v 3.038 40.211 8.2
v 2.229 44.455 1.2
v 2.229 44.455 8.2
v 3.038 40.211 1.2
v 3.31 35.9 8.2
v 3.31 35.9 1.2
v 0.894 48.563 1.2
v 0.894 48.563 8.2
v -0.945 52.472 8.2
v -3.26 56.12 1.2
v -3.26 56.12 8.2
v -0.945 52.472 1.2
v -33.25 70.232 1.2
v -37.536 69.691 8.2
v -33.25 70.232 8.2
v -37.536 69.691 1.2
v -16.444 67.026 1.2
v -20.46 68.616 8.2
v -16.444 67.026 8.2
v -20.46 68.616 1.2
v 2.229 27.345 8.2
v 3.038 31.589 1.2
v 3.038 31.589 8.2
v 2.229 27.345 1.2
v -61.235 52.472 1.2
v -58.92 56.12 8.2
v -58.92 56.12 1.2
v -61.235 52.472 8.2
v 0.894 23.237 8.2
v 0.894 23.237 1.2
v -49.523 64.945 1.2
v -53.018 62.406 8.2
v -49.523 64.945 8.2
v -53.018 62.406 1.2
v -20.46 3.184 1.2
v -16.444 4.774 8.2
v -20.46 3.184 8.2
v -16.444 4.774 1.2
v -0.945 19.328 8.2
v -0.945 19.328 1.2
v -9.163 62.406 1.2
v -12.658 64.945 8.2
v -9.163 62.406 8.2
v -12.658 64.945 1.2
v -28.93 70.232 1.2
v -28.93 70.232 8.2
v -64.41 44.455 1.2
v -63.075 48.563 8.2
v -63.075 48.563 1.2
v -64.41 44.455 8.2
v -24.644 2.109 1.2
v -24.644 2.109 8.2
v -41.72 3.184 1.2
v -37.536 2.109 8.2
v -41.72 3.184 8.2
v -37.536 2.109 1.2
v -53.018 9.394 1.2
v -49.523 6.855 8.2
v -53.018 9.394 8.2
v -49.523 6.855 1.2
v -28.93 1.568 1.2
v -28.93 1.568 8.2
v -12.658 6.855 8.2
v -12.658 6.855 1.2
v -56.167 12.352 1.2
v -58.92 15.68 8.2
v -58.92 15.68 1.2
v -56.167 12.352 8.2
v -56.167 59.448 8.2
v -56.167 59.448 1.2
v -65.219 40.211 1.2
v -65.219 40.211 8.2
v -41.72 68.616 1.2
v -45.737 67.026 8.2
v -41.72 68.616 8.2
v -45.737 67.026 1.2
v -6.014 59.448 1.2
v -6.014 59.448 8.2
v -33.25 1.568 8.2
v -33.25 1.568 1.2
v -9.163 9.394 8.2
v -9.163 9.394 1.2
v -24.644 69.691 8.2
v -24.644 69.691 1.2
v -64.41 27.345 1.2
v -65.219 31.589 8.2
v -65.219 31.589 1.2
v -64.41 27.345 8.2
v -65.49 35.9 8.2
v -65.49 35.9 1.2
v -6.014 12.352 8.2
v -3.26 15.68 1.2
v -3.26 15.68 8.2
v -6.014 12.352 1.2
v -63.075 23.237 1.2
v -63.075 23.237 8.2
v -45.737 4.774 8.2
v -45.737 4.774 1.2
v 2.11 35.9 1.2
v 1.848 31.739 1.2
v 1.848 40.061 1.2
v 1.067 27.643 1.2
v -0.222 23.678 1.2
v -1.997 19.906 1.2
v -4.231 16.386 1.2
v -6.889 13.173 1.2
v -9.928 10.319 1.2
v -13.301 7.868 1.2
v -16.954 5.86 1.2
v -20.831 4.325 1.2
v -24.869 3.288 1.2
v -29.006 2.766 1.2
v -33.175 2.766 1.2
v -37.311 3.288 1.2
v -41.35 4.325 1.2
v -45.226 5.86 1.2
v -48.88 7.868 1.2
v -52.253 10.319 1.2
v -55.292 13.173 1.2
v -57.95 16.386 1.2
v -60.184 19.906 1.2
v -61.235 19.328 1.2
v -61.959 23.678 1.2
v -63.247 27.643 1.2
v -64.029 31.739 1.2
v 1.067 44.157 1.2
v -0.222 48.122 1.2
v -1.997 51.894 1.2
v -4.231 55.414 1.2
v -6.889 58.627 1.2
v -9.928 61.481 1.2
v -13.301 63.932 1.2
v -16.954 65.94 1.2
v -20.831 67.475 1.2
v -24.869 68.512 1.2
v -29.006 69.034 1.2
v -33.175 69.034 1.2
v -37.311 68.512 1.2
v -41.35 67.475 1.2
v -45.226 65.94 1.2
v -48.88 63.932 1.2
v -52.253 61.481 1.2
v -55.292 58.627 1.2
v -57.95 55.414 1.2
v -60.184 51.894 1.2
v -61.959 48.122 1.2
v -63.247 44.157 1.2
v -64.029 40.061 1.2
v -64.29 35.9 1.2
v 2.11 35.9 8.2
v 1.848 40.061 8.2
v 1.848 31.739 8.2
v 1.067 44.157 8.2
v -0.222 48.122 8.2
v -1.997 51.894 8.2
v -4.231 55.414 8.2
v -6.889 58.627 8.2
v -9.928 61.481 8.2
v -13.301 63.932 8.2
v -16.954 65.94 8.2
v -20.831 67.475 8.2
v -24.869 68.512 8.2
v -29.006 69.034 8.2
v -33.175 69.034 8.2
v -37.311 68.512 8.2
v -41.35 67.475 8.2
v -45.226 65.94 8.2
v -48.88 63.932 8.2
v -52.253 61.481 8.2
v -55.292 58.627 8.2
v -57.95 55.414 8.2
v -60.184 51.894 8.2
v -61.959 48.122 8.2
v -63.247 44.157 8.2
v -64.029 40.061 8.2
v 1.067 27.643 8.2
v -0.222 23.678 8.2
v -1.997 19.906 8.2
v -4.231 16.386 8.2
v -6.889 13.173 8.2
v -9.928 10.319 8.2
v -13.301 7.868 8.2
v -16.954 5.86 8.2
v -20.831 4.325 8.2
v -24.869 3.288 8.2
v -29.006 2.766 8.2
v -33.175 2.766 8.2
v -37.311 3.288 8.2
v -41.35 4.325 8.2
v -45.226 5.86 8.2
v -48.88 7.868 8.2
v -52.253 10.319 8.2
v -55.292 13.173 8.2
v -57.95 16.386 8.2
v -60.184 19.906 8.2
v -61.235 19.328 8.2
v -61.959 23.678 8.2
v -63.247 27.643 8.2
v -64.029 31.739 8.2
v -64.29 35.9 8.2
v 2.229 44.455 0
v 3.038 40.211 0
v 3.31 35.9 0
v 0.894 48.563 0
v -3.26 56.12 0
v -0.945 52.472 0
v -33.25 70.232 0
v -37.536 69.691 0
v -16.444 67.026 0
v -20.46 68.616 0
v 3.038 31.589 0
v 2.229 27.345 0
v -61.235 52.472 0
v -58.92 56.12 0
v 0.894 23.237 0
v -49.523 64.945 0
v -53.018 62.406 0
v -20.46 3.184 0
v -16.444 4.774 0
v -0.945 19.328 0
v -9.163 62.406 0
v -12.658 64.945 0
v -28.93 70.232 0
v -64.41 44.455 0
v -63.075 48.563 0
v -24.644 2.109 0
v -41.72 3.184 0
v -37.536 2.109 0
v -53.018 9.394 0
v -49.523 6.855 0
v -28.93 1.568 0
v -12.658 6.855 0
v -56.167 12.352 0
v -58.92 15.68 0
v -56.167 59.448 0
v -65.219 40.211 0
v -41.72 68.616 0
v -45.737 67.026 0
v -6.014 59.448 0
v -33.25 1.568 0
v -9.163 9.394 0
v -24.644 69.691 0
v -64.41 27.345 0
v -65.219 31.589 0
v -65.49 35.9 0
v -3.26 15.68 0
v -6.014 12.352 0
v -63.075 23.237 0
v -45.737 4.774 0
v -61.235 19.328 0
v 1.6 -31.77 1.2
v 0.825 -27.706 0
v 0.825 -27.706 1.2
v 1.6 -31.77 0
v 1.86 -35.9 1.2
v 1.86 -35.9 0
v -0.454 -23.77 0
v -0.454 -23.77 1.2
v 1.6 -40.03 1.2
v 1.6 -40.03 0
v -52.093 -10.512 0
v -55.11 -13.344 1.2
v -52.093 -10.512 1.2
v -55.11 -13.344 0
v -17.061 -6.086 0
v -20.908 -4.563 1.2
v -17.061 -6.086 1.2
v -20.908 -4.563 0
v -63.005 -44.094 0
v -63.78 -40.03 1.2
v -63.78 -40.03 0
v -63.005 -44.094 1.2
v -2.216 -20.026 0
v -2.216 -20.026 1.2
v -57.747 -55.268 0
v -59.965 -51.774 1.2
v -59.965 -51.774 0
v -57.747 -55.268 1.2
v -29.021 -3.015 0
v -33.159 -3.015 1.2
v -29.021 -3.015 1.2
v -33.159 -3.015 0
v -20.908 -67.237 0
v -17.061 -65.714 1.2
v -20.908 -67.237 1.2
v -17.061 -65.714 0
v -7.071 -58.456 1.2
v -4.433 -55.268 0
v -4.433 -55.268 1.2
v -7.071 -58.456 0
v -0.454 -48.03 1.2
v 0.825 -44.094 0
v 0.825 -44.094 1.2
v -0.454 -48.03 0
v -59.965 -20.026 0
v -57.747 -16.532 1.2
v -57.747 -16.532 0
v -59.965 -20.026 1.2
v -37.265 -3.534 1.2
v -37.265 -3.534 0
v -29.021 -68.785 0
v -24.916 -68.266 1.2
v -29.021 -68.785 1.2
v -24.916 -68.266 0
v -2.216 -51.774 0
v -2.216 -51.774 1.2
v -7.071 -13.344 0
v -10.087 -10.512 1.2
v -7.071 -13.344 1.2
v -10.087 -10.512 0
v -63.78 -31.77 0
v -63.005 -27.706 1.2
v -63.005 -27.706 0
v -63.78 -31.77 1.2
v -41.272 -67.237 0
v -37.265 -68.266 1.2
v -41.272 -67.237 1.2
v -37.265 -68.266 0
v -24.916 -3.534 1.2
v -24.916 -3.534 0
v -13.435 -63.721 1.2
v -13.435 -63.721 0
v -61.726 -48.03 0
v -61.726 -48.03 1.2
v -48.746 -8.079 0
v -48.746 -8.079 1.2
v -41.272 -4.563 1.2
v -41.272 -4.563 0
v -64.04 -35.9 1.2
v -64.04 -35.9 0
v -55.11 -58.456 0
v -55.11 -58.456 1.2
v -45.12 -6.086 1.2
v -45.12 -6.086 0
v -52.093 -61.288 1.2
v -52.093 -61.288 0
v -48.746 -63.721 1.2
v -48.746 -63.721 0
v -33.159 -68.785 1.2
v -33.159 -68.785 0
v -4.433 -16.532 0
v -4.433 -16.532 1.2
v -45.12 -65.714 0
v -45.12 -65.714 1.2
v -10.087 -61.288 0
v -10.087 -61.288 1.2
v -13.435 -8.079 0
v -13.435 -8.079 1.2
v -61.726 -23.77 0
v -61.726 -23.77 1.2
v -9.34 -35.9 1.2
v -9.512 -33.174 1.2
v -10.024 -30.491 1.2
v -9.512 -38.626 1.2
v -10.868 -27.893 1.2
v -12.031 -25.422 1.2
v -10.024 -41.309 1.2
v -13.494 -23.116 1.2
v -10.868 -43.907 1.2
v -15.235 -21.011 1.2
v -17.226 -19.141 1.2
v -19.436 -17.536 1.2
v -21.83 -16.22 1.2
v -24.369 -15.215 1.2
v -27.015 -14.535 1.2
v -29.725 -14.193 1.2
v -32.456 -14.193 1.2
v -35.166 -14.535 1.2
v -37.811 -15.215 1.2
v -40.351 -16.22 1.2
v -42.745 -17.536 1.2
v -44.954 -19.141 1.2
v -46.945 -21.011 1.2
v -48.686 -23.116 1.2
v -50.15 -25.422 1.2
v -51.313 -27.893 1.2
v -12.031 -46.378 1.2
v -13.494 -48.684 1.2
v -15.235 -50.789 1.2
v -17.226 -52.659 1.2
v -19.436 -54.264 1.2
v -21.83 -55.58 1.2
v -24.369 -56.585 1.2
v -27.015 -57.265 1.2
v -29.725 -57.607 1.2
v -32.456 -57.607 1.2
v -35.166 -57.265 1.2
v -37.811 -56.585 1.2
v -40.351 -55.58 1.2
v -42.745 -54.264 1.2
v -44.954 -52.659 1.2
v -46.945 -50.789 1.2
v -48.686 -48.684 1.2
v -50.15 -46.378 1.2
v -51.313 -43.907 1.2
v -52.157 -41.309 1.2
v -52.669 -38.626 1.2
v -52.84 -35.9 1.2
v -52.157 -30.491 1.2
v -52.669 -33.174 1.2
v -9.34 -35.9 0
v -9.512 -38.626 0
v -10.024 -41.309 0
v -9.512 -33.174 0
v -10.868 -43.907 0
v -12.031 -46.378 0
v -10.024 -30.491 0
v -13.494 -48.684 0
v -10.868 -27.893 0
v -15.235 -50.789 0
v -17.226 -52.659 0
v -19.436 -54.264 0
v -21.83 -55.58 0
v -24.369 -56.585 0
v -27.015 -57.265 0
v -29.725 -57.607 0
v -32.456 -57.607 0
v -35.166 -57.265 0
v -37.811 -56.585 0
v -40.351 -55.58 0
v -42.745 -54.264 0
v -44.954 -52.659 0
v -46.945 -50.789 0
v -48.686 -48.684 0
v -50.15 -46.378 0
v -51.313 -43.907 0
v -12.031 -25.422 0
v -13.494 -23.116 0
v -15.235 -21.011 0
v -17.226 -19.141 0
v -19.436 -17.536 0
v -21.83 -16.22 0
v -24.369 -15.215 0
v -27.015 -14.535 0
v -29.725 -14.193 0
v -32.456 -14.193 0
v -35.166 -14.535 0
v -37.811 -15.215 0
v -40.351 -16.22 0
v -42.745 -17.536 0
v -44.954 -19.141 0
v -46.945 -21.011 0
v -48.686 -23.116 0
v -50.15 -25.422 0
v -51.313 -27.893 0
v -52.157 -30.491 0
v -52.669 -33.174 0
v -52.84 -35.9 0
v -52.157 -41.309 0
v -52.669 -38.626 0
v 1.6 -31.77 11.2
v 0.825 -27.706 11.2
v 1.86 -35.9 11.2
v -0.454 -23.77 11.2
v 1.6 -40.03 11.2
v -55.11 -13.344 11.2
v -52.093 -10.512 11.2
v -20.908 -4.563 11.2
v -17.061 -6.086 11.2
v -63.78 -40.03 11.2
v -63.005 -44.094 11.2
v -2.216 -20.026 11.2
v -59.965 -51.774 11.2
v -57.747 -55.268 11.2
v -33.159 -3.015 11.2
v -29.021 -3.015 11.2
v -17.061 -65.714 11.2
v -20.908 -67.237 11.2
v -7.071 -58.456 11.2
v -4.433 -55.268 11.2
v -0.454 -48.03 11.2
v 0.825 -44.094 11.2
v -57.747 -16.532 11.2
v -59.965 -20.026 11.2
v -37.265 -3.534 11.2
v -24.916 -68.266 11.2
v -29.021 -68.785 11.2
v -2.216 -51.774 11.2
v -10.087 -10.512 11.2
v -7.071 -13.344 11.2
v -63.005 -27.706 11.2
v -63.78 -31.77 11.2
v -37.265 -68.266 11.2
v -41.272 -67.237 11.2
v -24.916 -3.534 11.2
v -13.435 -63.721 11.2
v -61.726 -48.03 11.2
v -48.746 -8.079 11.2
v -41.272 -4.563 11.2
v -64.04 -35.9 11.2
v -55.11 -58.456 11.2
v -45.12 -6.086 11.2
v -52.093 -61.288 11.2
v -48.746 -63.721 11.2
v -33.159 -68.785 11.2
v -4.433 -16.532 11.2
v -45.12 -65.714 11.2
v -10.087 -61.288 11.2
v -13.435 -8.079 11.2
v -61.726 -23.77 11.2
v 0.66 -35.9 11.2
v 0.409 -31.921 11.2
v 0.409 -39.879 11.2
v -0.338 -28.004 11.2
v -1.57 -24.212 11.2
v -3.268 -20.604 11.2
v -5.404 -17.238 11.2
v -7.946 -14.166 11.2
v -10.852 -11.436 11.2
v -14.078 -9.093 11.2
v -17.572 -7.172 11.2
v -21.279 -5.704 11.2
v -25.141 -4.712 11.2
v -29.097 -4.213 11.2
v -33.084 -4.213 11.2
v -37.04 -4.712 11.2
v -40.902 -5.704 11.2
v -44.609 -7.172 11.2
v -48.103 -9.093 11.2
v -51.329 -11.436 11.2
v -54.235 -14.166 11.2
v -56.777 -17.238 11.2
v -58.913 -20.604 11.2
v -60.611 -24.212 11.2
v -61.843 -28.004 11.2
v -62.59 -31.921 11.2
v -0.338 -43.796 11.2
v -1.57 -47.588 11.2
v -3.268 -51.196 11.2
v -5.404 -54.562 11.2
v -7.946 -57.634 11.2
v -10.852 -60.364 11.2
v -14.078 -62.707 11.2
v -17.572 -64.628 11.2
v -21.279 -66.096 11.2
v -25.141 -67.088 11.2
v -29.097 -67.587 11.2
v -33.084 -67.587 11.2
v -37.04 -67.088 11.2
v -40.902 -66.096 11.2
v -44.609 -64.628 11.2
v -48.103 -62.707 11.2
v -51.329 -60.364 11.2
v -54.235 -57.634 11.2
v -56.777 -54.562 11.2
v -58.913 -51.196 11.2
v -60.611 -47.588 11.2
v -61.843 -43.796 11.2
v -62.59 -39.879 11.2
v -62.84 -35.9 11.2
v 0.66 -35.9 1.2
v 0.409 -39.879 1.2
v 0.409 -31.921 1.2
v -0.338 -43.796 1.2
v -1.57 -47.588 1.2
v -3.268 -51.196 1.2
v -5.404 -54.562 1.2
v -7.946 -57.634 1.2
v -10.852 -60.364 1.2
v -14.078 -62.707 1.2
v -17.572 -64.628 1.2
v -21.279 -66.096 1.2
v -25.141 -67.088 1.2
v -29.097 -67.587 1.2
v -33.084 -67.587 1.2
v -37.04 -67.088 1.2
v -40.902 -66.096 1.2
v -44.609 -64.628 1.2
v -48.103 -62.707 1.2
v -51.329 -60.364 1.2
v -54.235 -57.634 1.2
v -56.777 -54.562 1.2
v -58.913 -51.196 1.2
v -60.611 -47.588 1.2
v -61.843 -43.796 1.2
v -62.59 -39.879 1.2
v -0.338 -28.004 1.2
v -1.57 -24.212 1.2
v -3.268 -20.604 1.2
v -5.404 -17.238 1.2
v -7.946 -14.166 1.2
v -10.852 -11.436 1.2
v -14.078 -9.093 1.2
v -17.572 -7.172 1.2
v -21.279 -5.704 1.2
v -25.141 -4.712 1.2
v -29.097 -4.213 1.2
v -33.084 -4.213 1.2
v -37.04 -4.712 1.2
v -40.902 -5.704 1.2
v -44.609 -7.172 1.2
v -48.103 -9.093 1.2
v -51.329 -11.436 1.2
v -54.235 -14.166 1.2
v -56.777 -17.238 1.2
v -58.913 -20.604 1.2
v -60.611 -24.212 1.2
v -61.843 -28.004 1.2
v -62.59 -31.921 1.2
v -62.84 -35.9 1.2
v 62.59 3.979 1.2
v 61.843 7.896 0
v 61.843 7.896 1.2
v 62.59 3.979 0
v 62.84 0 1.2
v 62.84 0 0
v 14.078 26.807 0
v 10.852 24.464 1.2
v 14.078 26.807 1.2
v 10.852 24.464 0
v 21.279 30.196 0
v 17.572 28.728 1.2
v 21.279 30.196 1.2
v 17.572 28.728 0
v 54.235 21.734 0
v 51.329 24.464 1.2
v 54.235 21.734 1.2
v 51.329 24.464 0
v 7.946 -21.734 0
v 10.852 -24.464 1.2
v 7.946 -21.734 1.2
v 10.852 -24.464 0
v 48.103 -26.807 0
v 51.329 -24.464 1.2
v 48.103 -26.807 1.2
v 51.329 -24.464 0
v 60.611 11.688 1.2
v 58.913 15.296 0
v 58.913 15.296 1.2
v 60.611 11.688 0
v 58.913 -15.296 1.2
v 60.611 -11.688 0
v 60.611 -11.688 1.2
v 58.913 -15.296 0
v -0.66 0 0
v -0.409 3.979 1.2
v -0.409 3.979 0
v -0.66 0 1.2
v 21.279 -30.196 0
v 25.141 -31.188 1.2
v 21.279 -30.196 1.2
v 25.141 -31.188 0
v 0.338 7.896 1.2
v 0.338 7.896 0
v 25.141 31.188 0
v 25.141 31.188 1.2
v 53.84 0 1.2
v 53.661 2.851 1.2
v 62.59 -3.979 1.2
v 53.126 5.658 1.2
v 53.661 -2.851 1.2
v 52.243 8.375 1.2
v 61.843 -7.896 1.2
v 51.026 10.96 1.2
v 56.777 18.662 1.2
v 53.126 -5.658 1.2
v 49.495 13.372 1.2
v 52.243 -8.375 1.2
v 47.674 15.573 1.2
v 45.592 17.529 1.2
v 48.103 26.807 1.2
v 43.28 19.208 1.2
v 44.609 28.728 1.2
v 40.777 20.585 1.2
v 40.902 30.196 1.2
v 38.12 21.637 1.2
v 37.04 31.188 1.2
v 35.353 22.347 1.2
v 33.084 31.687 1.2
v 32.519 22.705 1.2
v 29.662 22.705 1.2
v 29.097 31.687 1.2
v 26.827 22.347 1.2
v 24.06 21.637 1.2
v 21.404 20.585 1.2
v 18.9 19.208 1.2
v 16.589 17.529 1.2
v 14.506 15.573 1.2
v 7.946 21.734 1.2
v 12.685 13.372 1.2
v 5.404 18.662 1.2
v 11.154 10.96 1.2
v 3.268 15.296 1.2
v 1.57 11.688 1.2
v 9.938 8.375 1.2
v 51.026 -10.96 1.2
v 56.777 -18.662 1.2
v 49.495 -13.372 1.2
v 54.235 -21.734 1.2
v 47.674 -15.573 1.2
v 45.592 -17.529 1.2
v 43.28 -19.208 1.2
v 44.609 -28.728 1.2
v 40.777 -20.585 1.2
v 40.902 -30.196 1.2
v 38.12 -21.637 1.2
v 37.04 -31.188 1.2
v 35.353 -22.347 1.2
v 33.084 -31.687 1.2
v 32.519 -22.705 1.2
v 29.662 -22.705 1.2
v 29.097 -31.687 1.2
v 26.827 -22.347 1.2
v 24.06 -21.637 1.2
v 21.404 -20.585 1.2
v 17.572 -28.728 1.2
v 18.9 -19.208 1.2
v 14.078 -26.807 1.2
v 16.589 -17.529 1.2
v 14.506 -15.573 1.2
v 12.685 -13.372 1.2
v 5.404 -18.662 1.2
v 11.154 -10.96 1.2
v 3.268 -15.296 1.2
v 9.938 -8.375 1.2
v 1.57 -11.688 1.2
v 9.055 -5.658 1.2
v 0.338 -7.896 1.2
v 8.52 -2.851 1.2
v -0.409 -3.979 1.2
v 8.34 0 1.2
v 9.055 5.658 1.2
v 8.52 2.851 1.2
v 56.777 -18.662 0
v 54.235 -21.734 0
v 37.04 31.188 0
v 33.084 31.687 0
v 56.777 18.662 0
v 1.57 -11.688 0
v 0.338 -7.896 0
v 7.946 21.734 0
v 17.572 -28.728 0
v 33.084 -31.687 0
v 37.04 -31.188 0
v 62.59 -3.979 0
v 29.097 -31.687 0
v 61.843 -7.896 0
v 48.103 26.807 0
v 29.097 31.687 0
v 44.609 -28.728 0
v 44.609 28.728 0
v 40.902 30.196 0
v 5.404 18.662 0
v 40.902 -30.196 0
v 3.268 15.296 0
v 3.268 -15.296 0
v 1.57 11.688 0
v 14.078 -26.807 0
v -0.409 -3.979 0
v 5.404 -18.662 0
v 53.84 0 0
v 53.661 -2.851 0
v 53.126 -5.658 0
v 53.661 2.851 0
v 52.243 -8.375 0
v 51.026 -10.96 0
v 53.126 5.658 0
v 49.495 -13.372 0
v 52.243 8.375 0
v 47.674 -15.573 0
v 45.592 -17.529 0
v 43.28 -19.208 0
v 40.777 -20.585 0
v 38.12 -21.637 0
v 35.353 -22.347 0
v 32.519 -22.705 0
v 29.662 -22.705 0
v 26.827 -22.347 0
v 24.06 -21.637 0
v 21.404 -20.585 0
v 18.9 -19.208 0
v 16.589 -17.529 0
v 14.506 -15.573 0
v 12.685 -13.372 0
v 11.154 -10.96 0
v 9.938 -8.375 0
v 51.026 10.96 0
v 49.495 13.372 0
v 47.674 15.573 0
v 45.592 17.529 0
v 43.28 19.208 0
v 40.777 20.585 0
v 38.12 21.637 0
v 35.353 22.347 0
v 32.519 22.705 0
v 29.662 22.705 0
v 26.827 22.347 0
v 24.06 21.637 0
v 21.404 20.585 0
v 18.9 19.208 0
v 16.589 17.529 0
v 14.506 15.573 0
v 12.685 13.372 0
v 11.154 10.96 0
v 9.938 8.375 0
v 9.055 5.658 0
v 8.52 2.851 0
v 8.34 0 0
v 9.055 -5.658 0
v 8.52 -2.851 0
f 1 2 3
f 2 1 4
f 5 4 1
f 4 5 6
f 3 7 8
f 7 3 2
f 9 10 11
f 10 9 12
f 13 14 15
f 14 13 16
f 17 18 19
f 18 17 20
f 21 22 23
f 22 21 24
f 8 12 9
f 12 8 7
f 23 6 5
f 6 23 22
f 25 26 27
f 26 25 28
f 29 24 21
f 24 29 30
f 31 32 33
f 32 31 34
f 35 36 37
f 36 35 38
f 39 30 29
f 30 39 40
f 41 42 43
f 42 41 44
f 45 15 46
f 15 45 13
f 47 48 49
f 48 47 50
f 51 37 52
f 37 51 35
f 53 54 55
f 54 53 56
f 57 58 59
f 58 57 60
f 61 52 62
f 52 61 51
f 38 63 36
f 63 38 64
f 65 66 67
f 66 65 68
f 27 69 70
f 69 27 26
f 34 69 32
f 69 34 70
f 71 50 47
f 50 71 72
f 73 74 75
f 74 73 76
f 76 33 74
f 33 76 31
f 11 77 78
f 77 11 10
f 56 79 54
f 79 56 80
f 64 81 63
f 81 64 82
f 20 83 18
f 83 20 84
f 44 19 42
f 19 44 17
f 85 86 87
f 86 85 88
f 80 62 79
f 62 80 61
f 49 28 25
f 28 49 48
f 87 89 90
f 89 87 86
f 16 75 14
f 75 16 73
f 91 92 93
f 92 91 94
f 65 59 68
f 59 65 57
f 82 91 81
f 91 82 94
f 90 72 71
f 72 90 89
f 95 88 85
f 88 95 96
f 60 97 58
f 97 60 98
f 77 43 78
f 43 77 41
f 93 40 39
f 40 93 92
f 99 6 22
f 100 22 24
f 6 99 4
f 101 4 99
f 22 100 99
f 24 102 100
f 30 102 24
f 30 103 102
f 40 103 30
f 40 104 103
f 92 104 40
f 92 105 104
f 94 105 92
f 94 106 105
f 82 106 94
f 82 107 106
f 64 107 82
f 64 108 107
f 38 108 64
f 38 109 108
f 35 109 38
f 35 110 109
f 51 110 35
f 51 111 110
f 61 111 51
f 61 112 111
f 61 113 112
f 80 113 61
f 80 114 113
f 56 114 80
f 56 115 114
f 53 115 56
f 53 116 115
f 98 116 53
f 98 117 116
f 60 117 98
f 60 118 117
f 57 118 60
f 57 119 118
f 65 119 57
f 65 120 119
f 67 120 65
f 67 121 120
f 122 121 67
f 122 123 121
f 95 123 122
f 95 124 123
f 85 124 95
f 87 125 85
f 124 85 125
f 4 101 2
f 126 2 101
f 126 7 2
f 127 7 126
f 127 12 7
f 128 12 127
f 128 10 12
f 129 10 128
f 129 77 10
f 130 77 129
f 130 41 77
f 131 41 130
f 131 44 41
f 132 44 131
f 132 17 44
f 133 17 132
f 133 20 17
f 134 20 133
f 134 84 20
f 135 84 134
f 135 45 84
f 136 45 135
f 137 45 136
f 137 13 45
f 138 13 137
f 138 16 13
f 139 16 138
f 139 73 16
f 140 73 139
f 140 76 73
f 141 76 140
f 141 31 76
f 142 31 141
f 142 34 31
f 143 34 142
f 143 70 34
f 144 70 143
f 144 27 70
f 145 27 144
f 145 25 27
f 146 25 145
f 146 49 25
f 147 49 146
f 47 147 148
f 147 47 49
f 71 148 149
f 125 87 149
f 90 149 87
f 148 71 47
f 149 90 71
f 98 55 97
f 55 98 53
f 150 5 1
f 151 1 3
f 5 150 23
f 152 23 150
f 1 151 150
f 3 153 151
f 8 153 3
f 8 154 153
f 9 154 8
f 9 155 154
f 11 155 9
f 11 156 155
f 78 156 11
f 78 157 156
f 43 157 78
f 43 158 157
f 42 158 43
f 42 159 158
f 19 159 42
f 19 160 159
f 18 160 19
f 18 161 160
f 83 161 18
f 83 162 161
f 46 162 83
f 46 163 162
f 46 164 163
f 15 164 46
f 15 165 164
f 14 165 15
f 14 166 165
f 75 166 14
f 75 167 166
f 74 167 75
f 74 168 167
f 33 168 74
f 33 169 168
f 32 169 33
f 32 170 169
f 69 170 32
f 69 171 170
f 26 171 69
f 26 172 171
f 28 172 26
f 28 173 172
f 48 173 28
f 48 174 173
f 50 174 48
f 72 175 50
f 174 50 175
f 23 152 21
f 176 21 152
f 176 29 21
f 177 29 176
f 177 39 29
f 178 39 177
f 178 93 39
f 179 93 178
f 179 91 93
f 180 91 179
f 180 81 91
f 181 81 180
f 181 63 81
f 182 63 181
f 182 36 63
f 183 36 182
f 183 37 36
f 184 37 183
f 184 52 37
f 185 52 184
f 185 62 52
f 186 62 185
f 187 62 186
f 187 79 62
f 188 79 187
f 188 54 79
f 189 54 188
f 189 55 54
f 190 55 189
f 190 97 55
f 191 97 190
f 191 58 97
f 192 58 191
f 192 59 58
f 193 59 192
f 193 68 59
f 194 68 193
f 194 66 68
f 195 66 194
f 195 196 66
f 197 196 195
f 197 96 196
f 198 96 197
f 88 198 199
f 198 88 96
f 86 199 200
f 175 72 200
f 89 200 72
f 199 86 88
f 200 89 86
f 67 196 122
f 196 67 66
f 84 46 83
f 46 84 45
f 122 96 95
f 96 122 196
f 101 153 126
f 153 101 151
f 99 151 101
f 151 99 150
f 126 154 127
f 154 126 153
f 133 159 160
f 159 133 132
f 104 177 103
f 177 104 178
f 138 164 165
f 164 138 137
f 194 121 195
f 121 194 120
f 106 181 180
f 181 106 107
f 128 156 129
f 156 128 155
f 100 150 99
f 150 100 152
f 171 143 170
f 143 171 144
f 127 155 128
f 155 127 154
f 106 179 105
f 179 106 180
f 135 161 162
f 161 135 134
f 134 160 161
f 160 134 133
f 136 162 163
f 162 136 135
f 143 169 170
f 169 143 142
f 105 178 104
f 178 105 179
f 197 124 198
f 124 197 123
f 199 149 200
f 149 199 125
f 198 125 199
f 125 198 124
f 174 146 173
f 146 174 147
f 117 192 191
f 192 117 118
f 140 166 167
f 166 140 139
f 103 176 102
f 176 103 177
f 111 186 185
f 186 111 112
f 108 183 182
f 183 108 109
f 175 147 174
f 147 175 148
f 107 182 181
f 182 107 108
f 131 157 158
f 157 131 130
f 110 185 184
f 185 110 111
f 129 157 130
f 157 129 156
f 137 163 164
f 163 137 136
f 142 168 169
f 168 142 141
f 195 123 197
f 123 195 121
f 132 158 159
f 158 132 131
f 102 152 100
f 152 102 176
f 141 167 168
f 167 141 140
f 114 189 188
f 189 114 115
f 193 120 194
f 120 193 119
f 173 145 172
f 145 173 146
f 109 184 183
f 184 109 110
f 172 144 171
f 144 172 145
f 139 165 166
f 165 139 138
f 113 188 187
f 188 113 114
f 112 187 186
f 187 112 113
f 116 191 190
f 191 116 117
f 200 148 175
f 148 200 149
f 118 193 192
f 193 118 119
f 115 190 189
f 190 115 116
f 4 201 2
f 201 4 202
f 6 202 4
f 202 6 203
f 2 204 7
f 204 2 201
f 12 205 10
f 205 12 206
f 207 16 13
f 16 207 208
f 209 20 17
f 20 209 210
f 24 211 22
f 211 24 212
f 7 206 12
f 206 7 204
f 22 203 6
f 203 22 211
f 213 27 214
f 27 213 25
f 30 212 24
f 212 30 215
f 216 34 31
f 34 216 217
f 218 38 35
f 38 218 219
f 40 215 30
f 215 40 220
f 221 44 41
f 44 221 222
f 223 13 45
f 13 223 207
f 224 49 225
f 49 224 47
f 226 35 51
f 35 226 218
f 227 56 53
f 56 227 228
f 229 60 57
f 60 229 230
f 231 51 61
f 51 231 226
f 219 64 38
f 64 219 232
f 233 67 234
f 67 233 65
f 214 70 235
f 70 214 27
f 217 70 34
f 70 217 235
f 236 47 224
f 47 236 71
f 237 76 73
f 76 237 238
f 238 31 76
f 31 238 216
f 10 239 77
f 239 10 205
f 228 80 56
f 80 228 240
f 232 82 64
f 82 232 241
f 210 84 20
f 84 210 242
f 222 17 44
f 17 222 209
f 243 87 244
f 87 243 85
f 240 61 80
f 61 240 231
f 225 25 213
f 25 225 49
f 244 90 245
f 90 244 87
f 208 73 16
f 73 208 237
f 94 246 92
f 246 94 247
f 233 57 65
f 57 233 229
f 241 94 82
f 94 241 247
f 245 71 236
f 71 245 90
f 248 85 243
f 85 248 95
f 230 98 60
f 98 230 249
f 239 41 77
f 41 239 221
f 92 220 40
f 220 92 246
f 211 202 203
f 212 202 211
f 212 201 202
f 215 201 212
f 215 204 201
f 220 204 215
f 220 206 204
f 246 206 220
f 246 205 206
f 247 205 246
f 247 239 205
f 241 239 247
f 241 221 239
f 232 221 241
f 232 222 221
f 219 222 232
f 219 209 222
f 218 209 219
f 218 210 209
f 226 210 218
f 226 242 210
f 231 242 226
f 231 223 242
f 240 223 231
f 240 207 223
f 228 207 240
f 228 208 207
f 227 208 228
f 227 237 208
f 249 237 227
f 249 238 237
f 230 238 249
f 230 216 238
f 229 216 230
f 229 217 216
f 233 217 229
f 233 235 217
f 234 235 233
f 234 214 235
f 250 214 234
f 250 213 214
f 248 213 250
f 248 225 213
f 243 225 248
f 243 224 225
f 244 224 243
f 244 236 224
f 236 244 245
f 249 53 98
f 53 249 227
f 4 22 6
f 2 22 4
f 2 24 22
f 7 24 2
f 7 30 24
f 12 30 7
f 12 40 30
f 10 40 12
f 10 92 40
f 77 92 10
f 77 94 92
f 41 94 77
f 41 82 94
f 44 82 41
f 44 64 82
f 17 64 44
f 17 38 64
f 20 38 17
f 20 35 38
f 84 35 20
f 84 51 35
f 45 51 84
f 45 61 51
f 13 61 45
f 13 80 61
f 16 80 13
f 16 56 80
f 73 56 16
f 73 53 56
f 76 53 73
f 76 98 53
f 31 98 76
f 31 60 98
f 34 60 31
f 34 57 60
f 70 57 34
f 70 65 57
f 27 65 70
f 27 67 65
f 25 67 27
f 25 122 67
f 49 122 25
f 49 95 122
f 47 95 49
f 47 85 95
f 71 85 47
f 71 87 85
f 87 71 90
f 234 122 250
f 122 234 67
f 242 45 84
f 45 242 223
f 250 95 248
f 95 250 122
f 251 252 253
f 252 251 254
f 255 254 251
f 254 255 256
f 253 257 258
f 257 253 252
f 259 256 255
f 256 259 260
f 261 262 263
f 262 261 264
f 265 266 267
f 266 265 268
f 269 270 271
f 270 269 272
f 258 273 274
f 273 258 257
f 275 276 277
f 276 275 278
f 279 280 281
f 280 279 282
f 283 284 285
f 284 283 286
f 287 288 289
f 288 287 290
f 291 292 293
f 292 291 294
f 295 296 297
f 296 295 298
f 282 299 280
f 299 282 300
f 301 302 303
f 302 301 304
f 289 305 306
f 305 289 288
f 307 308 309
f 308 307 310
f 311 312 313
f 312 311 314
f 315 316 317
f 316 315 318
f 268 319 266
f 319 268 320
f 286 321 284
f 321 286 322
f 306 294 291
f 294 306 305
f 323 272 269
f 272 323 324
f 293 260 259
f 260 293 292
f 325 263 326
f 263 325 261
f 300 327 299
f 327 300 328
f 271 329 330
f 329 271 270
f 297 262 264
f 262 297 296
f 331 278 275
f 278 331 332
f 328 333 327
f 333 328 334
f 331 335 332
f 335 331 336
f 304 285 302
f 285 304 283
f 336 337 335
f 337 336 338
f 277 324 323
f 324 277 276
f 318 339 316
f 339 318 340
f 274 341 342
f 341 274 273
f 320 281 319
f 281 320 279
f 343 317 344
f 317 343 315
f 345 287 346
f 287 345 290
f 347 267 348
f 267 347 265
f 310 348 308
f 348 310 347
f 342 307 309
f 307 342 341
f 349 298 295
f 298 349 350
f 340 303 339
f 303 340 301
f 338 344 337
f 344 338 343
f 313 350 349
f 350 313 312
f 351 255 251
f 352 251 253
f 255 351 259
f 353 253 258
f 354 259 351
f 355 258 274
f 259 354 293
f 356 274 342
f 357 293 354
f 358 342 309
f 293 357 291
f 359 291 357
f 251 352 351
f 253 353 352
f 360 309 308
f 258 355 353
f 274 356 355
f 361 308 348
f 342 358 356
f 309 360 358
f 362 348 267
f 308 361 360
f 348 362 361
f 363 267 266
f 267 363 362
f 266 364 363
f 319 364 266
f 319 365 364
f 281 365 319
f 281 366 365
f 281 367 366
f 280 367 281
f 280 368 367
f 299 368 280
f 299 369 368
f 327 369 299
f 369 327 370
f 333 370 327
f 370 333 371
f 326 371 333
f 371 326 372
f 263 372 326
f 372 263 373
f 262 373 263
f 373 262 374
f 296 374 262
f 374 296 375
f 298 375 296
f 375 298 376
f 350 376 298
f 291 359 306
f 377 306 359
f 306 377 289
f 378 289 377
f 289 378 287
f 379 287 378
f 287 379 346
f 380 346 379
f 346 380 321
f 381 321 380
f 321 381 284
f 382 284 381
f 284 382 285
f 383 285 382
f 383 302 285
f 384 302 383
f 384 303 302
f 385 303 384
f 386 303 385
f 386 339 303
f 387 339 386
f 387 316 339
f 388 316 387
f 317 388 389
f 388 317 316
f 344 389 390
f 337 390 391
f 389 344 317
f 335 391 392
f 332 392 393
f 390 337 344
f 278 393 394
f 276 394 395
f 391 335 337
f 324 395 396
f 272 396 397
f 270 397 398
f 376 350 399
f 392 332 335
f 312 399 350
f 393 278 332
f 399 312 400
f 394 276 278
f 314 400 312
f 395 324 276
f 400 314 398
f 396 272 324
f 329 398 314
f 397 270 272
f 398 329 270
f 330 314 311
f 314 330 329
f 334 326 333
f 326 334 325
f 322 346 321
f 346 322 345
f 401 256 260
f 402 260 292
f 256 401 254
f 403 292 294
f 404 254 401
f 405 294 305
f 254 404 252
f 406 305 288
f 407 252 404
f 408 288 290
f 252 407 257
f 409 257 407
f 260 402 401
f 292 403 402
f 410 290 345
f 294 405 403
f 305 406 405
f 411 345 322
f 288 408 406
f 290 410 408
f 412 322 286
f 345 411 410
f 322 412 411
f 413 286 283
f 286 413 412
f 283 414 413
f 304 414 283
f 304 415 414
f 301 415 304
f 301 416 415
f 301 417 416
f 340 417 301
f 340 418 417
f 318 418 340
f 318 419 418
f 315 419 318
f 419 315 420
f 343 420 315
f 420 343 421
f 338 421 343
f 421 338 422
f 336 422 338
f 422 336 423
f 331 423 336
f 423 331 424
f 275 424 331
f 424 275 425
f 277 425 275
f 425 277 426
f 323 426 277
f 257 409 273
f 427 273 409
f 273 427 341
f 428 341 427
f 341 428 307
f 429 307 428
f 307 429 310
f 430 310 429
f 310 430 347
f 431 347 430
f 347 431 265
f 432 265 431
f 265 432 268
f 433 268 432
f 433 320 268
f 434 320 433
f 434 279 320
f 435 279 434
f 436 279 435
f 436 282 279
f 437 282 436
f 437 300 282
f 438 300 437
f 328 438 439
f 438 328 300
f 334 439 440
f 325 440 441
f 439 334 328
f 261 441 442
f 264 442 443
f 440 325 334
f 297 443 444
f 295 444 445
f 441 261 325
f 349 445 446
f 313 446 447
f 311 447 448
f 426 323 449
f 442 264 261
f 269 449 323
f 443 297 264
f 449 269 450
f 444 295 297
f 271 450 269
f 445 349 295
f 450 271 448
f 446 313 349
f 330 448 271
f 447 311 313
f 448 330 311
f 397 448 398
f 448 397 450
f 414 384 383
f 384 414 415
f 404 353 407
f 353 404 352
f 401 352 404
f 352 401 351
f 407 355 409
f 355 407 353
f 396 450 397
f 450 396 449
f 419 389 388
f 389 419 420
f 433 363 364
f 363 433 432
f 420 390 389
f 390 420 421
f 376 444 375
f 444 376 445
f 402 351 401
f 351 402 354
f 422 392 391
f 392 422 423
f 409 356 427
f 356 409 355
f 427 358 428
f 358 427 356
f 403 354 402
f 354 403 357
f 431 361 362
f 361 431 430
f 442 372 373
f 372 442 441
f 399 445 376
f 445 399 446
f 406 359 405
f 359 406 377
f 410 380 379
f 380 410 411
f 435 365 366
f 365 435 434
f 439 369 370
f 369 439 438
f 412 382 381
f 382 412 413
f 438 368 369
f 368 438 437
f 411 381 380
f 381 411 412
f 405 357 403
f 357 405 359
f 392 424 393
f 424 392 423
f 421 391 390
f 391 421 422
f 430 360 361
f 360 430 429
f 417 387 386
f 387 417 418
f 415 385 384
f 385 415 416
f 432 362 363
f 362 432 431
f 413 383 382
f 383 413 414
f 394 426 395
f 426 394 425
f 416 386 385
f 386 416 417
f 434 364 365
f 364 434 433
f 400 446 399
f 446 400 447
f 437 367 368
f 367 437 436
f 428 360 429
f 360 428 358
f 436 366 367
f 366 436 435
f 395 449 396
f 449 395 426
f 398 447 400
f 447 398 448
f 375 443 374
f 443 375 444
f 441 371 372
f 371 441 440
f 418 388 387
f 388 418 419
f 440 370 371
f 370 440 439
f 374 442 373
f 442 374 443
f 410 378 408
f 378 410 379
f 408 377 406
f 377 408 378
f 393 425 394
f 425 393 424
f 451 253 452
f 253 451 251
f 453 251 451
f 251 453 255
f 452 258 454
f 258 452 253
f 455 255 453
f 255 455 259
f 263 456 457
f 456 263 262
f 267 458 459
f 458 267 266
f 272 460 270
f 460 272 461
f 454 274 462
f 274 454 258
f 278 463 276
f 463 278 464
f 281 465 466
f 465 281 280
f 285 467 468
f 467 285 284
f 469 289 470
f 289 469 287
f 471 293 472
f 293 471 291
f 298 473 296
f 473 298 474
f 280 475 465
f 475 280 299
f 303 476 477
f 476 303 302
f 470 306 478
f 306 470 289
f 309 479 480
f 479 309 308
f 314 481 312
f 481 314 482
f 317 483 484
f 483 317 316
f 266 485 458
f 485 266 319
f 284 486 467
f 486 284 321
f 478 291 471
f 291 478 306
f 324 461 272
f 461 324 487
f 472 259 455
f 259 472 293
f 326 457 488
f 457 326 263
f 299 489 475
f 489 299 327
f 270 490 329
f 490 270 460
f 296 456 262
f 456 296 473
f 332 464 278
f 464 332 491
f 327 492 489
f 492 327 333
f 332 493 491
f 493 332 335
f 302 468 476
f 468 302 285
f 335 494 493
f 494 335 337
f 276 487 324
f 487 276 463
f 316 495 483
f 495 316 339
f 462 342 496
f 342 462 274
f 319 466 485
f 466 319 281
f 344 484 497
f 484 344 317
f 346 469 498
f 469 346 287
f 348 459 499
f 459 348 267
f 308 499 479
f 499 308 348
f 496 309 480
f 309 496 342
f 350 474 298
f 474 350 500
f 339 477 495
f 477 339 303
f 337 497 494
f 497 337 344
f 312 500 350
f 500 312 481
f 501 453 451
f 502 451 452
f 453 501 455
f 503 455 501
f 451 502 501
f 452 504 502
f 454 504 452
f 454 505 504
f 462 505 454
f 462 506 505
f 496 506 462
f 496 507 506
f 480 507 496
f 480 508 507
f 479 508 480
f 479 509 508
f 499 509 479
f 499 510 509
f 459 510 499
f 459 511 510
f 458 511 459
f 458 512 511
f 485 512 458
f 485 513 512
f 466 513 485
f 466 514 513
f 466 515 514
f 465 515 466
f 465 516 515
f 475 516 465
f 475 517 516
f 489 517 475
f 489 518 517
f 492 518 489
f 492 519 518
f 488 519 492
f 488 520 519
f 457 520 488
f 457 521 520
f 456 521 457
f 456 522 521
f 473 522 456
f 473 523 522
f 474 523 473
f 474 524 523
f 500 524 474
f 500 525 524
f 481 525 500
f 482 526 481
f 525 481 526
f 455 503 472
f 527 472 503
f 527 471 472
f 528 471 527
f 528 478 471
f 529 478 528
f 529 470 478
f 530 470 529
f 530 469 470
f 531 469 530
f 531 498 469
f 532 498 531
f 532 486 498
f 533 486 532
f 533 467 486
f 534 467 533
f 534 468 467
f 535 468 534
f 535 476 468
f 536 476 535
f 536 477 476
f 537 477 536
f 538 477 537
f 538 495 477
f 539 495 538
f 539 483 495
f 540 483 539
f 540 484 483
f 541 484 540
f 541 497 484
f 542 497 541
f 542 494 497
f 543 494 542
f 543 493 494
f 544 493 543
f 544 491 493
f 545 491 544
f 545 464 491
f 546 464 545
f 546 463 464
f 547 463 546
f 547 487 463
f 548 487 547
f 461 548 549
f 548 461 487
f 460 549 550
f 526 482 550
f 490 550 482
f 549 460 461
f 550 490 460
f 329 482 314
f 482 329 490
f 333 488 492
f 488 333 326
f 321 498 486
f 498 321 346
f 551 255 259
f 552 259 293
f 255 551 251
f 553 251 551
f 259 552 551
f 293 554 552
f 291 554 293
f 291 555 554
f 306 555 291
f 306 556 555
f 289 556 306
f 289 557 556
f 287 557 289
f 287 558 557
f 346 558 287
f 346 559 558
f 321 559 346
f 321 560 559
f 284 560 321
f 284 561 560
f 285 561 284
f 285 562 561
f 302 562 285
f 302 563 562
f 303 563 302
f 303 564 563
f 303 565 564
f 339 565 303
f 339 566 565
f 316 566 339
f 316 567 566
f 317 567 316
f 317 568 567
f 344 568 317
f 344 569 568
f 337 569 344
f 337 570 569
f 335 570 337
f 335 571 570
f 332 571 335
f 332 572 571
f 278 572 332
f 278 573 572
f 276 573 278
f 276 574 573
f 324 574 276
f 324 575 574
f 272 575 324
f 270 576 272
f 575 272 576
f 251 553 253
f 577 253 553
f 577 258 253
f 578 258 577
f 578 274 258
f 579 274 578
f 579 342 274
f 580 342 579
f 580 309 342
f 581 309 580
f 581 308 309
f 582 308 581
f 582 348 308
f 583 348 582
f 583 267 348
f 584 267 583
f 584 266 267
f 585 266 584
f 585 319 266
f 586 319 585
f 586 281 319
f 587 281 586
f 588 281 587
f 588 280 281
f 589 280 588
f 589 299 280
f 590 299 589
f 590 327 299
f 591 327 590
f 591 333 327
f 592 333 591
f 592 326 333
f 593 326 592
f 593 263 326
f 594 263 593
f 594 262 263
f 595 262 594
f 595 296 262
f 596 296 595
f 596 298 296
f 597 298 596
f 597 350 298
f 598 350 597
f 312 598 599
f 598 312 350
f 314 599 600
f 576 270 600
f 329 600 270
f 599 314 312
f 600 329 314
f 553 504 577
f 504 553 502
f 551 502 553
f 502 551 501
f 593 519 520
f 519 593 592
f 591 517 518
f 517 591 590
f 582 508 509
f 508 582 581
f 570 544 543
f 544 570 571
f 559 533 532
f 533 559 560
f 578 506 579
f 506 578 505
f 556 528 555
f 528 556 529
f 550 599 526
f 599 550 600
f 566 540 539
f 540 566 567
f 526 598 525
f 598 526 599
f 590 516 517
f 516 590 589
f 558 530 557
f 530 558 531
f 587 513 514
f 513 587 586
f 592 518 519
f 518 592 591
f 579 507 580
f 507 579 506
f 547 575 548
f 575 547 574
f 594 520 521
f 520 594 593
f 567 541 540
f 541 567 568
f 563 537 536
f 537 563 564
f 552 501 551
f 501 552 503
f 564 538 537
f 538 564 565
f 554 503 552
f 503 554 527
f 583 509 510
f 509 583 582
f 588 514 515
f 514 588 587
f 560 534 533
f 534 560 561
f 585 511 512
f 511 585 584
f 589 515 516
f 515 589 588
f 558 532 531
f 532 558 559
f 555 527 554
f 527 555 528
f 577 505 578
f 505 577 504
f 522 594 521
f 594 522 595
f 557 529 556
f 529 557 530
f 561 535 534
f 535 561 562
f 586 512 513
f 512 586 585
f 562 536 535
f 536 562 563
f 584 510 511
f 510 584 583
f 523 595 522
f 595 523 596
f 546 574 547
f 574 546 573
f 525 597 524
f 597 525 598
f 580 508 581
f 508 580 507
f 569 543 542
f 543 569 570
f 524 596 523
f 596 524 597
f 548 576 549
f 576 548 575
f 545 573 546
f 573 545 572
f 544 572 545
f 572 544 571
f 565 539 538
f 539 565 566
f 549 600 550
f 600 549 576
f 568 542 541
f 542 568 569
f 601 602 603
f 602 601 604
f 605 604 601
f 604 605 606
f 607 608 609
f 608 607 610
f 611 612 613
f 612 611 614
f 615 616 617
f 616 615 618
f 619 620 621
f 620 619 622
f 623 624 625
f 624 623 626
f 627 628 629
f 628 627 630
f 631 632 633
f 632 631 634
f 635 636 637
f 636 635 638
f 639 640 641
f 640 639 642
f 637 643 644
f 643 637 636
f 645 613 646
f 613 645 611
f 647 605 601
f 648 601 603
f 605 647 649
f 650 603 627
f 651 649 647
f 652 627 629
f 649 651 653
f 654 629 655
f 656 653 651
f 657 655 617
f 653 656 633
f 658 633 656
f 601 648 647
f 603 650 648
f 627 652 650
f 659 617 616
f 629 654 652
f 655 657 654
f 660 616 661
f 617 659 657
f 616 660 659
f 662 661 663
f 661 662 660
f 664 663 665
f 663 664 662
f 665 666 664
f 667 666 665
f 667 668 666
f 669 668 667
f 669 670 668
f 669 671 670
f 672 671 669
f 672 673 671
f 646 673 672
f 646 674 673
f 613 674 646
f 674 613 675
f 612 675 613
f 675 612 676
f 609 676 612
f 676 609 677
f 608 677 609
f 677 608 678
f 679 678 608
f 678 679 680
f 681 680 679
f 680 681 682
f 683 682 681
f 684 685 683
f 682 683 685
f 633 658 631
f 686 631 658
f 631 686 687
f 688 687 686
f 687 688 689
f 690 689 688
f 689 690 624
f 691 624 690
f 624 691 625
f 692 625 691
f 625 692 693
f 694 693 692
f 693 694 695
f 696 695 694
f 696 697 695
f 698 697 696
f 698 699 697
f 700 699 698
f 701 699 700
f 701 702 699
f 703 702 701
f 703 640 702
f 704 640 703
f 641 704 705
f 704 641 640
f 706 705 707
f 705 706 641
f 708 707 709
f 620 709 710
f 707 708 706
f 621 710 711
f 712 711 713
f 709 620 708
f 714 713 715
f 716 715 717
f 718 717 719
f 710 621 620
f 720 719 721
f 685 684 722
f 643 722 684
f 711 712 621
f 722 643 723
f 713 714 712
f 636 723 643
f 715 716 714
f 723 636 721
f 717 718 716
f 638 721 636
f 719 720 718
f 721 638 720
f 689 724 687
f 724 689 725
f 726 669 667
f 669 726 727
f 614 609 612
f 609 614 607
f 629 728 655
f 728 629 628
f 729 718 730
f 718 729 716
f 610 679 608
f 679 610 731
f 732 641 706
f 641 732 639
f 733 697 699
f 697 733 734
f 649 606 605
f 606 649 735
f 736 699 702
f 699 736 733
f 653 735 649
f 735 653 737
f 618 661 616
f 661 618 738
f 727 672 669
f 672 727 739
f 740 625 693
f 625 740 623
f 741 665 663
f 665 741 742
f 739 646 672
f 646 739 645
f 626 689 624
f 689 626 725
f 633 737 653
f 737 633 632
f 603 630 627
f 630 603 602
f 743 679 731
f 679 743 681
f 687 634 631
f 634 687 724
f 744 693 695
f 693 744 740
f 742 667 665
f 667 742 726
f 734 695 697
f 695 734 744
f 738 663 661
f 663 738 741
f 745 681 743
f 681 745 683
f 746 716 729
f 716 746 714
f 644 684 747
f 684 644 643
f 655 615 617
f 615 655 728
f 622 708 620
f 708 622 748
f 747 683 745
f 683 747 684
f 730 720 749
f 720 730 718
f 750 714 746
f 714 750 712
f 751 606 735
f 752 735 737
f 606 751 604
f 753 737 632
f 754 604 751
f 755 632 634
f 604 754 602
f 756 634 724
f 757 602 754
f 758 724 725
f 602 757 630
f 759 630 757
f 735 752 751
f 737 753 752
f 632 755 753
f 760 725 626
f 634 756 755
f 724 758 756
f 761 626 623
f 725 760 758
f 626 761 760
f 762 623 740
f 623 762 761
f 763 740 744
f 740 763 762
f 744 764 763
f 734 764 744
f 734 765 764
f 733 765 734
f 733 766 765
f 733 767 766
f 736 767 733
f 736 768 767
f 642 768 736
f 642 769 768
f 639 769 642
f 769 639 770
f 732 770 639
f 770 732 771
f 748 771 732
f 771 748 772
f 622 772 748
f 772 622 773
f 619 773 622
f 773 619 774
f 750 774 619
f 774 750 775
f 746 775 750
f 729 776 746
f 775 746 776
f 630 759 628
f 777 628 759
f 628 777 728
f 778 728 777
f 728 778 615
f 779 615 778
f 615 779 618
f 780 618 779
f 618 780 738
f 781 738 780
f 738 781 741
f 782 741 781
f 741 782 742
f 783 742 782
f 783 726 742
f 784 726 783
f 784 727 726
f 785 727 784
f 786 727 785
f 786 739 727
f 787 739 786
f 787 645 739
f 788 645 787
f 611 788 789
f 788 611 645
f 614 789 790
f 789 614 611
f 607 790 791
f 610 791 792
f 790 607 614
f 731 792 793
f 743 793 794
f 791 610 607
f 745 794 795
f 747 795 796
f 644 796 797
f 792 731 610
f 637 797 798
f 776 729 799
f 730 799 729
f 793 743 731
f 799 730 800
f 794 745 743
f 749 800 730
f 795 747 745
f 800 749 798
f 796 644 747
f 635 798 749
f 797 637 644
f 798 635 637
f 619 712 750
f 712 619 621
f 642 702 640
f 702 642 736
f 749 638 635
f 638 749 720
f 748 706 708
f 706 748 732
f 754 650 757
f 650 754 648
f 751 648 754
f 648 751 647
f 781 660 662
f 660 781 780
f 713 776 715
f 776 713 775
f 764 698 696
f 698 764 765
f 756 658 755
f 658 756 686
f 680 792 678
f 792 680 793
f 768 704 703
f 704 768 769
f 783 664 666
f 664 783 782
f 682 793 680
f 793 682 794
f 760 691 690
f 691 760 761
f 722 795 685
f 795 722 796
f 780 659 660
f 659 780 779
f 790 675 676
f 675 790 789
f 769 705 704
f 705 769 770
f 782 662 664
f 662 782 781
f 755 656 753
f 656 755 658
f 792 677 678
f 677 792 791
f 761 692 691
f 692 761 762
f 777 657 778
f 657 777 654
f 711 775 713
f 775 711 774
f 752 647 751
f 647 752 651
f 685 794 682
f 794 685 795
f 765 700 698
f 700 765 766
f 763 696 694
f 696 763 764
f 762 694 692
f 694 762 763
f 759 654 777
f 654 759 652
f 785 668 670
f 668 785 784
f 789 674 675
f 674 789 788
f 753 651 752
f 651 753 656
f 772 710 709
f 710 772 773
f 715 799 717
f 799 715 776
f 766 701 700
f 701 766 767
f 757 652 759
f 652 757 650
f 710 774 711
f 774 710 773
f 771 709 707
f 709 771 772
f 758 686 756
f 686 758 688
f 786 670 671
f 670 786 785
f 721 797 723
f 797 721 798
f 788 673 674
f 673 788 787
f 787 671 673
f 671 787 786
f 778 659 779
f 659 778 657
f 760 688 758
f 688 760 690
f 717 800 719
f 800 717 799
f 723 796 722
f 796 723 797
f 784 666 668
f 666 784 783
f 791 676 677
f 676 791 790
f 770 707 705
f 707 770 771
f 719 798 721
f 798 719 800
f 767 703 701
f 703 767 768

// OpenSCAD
part = "all"; // [holder:Holder Only,ring:Ring Only,cover:Cover Only,all:Holder Ring and Cover]

// outside diameter in mm of one binocular tube
diameter=63.5;

// thickness of the walls in mm (for best results, make this a multiple of your nozzle width)
wall_thickness = 1.2;

// width of the ring of material on the holder that prevents the filter from falling through
holder_annulus_width = 10;

//width of the ring that sandwiches the filter from the inside (should be slightly smaller than holder_annulus_width)
ring_annulus_width = 9;

// depth of the filter holder that slides over the binoculars
holder_depth = 10;

// depth of the cover that slides over the holder
cover_depth = 7;

// amount of gap between the cover and the holder
cover_gap = 0.25;

// the distance between parts when printed together
part_spacing = 3;

/* [Hidden] */
cover_inner_diameter = diameter + 2 * wall_thickness + 2 * cover_gap;
cover_outer_diameter = cover_inner_diameter + 2 * wall_thickness;


module cover() {
    union() {
        translate([0, 0, wall_thickness / 2]) {
            cylinder(h = wall_thickness,
                     d = cover_outer_diameter,
                     center = true,
                     $fn=50);  
        }
        translate([0 , 0, wall_thickness + cover_depth / 2]) {
            difference() {
                cylinder(h = cover_depth,
                         d = cover_outer_diameter,
                         center = true,
                         $fn = 50);
                cylinder(h = cover_depth + 1,
                         d = cover_inner_diameter,
                         center = true,
                         $fn = 50);                    
            }
        }
    }
}

module holder() {
    union() {
        translate([0, 0, wall_thickness / 2]) {
            difference() {
                cylinder(h = wall_thickness,
                         d = diameter + 2 * wall_thickness,
                         center = true,
                         $fn = 50);
                cylinder(h = wall_thickness + 1,
                         d = diameter - 2 * holder_annulus_width,
                         center = true,
                         $fn = 50);
            }
        }
        translate([0, 0, holder_depth / 2 + wall_thickness]) {
            difference() {
                cylinder(h = holder_depth,
                         d = diameter + 2 * wall_thickness,
                         center = true,
                         $fn = 50);
                cylinder(h = holder_depth + 1,
                         d = diameter,
                         center = true,
                         $fn = 50);
            }
        }
    }
}


module ring() {
    union() {
         translate([0, 0, wall_thickness / 2]) {
            difference() {
                cylinder(h = wall_thickness, 
                         d = diameter,
                         center = true,
                         $fn = 50);                    
                cylinder(h = wall_thickness + 1, 
                         d = diameter - ring_annulus_width * 2,
                         center = true,
                         $fn = 50);                    
            }
        }
    }
}


// Create one STL file at a time
if (part == "cover") {
    cover();
} else if (part == "holder") {
    holder();
} else if (part == "ring") {
    ring();
} else if (part == "all") {
    spacing = cover_outer_diameter + part_spacing;
    
    translate([-spacing * sqrt(3) / 4, spacing / 2, 0]) cover();
    translate([-spacing * sqrt(3) / 4, -spacing / 2, 0]) holder();
    translate([spacing * sqrt(3) / 4, 0, 0]) ring();
}
